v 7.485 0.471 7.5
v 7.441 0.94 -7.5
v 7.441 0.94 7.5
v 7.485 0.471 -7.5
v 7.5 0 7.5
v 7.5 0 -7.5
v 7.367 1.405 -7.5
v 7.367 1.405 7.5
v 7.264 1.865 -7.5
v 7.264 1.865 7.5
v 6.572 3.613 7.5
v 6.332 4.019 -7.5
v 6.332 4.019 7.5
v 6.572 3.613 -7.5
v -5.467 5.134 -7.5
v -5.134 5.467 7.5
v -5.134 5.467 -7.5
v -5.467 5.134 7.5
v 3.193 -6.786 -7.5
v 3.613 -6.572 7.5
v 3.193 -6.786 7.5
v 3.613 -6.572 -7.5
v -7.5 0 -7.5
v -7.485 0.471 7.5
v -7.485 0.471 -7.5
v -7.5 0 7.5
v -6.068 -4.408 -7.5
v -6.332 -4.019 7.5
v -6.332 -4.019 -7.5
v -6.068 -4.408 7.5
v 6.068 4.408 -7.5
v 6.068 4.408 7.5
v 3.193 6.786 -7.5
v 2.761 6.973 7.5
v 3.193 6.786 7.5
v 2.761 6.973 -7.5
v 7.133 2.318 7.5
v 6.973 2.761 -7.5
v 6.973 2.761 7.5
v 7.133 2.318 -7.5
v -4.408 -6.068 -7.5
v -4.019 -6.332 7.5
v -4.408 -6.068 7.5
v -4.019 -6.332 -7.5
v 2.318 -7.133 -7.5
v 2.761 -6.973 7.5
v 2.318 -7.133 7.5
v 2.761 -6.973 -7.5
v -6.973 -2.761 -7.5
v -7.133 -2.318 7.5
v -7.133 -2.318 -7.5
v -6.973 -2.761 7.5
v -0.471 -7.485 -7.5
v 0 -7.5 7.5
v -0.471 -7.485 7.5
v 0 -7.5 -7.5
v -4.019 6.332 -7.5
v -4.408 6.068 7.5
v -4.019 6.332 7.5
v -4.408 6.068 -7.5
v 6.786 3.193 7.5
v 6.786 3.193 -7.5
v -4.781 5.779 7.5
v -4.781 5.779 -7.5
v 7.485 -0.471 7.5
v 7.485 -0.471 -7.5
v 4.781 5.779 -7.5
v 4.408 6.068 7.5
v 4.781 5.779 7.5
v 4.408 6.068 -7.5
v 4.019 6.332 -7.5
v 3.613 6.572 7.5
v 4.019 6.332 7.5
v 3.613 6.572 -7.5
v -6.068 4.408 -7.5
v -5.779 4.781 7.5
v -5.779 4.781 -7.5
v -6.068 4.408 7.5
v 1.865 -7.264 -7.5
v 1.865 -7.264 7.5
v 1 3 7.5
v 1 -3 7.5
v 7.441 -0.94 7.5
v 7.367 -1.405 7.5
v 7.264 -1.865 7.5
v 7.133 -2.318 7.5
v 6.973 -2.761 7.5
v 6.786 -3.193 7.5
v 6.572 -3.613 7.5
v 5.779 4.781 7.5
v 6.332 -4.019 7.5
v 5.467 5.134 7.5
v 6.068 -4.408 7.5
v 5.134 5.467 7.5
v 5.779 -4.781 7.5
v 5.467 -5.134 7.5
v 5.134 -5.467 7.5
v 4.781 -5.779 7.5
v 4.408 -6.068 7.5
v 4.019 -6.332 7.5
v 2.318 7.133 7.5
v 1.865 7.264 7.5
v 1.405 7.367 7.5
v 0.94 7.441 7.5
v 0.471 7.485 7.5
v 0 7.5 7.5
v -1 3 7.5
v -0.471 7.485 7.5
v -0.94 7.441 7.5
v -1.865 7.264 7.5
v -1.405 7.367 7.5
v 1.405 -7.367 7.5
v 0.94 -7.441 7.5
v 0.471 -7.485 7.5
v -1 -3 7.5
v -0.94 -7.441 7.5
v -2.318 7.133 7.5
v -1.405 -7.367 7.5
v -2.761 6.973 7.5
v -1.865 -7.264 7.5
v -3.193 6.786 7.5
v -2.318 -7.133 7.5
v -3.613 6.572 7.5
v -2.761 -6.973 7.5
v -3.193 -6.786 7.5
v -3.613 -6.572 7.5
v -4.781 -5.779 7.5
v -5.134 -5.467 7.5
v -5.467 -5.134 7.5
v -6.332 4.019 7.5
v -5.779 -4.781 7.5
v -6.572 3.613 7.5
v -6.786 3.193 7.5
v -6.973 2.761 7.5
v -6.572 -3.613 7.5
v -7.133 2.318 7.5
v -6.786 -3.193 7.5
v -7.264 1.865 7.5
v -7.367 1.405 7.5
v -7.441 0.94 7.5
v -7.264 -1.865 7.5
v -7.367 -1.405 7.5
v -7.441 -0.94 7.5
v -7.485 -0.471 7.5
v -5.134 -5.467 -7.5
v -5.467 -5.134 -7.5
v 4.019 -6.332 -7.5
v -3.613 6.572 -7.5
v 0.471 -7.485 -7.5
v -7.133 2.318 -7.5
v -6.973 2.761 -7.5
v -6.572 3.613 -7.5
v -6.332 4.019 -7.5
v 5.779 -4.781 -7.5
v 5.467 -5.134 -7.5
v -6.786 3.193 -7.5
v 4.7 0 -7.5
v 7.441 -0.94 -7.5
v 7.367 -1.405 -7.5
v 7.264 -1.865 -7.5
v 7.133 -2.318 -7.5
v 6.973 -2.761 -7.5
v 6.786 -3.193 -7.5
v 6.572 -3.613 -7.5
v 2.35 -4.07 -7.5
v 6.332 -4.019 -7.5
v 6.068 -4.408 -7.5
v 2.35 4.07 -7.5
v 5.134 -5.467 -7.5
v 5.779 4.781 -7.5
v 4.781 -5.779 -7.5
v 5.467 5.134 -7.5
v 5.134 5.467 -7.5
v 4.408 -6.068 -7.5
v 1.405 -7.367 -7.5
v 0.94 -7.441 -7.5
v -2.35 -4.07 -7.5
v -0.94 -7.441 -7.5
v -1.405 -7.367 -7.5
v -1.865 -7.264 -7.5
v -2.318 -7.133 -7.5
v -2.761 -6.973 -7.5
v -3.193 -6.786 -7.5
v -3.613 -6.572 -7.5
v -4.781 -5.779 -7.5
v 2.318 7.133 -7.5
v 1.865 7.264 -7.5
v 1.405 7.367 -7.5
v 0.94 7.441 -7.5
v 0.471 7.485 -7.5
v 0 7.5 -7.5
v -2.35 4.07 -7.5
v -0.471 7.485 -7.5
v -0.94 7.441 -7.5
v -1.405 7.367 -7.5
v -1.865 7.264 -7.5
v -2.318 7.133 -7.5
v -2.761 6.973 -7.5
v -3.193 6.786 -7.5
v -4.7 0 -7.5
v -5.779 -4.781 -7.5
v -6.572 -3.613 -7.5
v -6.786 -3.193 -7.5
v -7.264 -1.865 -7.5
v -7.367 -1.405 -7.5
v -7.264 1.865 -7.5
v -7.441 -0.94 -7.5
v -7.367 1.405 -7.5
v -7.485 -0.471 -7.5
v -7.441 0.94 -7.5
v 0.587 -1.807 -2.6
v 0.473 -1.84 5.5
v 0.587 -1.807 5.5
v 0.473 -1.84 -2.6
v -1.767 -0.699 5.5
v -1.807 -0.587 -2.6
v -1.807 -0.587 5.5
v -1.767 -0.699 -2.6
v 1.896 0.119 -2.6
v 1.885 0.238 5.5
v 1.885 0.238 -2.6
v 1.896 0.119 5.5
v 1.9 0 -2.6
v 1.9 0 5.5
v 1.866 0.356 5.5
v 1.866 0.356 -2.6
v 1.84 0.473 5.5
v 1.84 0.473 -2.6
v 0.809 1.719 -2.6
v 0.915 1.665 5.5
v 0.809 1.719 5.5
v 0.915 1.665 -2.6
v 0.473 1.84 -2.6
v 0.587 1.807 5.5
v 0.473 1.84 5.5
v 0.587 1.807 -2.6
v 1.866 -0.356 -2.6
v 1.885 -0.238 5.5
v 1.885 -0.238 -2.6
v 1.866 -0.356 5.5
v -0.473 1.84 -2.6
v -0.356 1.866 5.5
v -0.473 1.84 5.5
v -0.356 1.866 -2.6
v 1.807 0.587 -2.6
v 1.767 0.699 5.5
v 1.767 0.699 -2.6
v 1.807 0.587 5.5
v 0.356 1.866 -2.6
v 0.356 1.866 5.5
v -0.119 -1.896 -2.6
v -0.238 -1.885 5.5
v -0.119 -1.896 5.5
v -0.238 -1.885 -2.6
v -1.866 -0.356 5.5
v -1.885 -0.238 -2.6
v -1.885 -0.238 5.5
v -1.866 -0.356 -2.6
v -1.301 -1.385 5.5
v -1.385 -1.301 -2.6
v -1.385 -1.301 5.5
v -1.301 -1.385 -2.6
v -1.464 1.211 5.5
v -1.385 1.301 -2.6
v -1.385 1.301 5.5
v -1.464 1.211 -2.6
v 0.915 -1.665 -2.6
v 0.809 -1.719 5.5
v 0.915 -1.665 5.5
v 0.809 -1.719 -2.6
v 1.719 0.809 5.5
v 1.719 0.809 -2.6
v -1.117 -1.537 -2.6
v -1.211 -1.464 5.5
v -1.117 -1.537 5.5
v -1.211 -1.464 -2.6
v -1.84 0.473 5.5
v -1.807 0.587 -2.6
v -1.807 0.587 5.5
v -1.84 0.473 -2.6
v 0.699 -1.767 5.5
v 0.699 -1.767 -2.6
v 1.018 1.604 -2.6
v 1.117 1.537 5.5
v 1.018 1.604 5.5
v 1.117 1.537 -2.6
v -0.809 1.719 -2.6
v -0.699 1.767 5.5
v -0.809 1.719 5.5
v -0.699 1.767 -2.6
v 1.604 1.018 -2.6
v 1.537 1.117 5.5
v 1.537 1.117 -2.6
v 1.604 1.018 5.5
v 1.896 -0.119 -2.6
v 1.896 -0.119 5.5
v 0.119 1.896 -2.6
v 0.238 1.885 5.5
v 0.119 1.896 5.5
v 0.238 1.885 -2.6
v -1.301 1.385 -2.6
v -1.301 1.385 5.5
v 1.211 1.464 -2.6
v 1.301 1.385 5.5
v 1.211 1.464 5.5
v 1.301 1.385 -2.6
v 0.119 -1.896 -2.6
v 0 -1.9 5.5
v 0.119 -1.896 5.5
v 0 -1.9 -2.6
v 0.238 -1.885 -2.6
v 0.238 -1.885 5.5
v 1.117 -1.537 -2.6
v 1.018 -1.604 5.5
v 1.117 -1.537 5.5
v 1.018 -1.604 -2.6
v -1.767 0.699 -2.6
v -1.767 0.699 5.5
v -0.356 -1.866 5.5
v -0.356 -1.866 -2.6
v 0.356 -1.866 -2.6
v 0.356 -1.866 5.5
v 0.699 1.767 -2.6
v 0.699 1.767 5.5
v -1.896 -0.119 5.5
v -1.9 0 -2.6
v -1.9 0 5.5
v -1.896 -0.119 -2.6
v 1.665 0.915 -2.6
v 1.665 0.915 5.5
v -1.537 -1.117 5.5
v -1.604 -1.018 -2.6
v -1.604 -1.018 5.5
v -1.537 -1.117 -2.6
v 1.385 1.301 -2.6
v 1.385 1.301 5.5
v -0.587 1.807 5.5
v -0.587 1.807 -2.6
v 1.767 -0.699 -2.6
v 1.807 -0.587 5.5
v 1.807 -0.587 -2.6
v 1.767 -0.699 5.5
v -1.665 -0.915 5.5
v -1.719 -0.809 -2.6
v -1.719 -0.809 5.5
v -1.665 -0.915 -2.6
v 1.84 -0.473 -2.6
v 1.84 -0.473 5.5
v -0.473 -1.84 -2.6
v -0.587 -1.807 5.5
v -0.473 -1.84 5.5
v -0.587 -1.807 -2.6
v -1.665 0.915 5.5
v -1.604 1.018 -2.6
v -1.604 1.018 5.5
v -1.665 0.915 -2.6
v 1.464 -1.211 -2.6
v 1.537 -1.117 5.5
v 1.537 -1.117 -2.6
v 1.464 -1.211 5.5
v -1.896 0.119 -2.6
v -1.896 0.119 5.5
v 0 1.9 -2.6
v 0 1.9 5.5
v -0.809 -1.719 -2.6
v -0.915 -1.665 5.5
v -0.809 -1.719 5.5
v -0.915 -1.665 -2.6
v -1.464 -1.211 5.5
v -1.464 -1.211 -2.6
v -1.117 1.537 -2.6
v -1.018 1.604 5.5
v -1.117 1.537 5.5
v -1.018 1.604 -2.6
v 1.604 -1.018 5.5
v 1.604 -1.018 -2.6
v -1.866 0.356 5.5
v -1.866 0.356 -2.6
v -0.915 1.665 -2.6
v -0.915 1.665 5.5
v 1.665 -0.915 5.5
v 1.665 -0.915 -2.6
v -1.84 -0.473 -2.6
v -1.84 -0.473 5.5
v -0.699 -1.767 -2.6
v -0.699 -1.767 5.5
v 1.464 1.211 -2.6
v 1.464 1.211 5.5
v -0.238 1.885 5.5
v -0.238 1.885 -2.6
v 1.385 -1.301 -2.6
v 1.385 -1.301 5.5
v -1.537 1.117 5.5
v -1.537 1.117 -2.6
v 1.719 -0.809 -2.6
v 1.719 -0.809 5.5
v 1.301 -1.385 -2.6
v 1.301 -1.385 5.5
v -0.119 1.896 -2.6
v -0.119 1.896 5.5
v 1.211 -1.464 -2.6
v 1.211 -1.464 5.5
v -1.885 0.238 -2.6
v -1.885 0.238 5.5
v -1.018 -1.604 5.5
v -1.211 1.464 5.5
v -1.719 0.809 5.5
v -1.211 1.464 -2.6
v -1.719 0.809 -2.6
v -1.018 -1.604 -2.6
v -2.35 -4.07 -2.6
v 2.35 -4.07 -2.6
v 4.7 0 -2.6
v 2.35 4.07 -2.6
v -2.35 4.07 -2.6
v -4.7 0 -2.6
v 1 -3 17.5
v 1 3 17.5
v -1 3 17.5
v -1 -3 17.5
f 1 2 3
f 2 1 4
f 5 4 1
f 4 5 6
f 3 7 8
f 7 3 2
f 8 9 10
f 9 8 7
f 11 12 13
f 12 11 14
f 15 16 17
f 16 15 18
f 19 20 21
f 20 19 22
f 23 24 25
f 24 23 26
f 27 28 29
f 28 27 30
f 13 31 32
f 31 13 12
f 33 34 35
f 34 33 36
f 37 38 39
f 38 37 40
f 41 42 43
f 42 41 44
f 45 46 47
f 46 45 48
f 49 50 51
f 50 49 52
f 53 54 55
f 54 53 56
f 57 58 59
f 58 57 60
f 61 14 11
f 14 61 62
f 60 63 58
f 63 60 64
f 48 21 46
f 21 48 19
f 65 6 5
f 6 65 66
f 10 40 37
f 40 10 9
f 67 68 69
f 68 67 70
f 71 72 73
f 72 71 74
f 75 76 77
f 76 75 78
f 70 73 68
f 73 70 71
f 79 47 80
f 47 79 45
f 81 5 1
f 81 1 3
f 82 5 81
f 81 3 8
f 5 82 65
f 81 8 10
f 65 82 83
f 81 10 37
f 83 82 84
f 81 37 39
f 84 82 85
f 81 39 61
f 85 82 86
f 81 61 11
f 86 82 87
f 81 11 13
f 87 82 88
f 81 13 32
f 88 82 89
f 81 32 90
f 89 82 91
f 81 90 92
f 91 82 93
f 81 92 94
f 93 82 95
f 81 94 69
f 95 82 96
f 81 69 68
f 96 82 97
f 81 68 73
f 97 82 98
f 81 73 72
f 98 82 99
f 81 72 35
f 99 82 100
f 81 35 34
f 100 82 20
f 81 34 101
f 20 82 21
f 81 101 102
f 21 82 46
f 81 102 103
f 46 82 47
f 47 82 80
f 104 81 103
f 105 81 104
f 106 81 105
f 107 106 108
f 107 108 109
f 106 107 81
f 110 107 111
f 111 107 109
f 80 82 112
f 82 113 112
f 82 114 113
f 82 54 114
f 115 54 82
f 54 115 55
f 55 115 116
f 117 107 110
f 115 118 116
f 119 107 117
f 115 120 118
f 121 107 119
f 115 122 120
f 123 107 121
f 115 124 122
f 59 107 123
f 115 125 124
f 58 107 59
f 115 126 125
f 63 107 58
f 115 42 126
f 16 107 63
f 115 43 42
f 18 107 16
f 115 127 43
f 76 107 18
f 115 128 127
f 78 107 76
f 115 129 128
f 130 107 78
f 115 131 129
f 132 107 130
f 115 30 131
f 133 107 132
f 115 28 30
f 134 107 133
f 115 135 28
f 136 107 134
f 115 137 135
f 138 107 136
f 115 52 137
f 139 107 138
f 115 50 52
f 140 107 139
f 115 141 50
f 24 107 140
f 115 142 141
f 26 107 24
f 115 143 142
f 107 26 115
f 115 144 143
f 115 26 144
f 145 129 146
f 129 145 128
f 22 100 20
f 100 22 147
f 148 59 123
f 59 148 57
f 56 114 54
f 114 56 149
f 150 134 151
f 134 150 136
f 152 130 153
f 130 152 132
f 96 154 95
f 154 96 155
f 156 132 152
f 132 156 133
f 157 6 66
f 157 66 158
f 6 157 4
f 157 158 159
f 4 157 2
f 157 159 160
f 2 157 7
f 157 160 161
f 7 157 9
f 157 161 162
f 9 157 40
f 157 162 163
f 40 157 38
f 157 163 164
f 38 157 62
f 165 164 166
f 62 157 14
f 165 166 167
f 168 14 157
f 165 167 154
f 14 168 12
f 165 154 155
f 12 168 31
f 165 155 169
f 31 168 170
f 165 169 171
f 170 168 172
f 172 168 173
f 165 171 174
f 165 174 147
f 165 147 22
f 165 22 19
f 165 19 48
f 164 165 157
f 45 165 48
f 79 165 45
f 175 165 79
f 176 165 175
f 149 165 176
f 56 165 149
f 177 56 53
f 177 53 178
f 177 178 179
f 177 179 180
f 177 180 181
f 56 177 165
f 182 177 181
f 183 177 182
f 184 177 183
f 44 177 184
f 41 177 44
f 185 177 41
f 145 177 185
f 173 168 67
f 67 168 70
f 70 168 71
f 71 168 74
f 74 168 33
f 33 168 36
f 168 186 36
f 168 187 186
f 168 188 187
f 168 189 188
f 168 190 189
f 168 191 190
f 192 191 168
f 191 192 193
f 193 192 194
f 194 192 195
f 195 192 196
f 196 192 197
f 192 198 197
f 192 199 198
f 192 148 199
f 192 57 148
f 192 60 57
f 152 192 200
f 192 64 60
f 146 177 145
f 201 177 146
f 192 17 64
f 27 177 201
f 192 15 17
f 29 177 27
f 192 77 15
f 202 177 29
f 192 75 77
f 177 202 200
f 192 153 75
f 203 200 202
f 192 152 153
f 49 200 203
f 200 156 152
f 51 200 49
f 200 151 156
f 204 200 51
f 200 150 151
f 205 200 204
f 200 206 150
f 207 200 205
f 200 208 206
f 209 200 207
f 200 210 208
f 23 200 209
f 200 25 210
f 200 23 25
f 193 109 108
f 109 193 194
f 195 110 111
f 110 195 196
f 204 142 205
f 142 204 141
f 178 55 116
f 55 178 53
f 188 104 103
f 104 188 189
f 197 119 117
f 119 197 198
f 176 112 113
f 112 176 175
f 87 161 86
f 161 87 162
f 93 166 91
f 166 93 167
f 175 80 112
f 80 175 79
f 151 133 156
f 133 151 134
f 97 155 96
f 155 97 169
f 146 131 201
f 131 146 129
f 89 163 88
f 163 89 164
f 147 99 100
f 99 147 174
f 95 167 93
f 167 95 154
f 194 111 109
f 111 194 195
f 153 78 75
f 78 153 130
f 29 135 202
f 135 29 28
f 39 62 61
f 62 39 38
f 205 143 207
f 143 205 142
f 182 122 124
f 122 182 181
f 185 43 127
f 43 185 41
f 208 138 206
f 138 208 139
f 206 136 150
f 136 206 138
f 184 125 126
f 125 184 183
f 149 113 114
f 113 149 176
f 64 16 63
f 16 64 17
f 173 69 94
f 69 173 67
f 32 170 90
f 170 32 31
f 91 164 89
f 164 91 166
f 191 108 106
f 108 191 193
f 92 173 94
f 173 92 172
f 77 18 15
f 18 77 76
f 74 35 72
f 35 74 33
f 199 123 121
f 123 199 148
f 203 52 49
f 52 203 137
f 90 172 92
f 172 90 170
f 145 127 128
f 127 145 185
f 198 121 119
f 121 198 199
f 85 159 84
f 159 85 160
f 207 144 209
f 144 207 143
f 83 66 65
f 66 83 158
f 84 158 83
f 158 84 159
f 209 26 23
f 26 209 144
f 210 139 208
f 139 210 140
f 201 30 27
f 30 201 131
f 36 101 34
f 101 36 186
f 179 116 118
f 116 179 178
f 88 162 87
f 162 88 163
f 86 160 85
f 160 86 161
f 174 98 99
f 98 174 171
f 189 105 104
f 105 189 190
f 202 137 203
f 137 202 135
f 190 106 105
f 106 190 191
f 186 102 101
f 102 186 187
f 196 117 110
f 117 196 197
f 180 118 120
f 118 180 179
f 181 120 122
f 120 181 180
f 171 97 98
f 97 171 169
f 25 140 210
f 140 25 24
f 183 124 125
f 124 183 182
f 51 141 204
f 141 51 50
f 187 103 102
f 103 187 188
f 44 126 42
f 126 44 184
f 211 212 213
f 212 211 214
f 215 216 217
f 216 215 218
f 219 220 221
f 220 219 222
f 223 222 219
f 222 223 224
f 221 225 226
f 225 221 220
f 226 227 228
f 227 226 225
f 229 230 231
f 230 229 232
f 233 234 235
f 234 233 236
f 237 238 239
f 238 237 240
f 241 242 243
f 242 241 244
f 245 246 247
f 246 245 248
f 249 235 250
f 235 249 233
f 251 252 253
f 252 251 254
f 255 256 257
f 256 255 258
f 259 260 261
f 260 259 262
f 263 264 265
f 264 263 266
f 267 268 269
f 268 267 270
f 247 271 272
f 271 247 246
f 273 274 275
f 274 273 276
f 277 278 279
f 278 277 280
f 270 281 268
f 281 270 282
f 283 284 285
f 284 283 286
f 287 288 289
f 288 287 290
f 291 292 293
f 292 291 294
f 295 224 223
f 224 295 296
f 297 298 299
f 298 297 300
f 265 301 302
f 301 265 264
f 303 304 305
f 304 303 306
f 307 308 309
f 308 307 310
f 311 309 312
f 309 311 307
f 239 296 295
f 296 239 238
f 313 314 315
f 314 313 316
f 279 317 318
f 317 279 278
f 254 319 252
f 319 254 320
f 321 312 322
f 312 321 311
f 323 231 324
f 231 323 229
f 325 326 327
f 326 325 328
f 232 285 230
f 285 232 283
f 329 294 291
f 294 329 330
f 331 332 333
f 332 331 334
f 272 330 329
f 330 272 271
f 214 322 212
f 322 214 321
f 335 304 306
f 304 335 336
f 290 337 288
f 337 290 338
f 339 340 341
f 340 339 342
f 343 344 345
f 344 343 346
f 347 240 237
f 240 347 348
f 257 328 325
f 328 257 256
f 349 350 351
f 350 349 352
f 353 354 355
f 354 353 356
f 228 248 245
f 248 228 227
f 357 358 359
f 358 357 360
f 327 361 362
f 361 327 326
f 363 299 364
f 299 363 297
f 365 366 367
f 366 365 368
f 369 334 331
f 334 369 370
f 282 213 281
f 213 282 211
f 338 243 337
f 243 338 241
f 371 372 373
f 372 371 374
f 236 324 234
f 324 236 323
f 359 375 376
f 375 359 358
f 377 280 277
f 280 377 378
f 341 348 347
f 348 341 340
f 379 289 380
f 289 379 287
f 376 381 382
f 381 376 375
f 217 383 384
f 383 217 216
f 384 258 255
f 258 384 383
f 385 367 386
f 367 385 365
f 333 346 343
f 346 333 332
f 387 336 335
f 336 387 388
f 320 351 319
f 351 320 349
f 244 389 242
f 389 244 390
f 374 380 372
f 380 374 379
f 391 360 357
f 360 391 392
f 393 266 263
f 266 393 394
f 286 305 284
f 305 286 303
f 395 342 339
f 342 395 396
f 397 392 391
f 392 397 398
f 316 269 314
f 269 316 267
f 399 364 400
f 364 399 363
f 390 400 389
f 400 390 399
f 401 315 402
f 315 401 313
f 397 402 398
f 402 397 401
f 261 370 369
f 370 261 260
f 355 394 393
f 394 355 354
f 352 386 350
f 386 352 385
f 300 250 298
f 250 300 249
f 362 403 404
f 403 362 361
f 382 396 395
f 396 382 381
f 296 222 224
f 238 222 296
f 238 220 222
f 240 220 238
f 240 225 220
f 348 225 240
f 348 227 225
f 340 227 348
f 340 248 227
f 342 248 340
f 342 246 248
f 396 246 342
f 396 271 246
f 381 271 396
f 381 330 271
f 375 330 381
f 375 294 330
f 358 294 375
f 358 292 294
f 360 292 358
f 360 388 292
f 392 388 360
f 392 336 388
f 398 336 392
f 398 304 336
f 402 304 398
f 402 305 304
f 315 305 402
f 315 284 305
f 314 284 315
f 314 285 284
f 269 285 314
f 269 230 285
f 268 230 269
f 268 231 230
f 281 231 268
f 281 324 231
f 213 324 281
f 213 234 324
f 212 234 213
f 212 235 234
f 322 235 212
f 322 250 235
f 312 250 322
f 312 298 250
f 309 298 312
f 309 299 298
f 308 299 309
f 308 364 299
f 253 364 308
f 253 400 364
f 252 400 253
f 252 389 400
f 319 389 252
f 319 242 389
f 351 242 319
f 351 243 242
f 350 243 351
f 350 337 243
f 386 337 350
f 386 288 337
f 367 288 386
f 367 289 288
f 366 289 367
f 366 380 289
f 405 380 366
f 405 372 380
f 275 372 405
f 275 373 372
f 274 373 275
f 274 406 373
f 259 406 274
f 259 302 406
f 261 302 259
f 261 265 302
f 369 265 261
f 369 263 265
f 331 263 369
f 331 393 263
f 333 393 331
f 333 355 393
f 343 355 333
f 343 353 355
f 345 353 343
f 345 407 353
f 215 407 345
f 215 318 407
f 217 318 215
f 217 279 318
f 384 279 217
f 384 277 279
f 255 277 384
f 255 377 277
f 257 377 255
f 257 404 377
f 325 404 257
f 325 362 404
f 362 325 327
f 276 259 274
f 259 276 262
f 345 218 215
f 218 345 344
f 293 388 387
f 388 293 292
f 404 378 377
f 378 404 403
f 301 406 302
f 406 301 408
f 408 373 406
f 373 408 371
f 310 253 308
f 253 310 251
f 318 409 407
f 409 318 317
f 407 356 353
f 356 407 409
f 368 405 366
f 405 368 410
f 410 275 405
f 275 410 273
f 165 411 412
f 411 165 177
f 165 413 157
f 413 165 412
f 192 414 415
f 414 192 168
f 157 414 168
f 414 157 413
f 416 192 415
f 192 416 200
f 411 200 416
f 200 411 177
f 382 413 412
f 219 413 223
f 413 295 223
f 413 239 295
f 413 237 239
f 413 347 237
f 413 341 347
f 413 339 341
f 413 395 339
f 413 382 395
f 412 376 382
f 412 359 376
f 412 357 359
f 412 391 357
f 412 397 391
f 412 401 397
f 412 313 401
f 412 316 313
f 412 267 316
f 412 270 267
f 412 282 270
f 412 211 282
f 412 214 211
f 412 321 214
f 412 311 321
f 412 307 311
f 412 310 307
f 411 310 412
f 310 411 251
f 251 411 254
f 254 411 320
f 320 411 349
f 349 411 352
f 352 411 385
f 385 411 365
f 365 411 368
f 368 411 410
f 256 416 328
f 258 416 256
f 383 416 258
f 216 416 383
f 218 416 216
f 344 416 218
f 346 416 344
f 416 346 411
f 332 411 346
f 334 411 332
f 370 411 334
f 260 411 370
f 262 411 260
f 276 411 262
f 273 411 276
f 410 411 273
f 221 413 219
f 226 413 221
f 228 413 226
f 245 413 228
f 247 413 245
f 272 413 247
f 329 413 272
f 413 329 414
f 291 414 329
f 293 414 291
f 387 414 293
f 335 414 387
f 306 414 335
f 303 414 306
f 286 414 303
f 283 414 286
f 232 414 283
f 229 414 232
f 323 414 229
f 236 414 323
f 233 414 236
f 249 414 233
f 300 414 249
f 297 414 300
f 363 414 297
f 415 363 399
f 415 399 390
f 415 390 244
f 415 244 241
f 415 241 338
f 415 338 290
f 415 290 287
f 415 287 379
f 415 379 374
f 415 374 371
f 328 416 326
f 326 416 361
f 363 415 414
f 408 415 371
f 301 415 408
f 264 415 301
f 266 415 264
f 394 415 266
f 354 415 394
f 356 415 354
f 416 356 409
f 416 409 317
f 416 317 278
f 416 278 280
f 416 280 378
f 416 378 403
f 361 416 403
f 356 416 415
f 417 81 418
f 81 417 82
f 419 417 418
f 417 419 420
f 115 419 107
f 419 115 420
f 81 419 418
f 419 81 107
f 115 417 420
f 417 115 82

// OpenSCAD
// [FL_INDEX: keywords="openscad, 3d_parametric, EndStop_Striker_for_Optical_EndStop, csg_solid" | COT="Parametric OpenSCAD design from 3DCodeverse"]
// Title: EndStop Striker for Optical EndStop

/* End stop striker for optical end stop
   -- Williams

http://www.amazon.com/OpenSCAD-3D-Printing-Al-Williams-ebook/dp/B00I6K19OM

The idea is to put an endstop bolt in through a
locknut (nylock) and then CA glue 
the nut to the body. This provides a narrow
striker for an optical end stop */


$fn=100+0;

// Main body diameter (mm)
main_diameter=15;
// Main body length (mm)
body_length=15;
// Nut diameter (mm; 8.5mm=#6)
nut_diameter=9.4;
// Nut height (mm; 5mm=#6)
nut_height=5;
// Depth to cut out nut (mm)
nut_depth=1;

// Striker length (mm)
striker_length=10;
// Striker width (mm)
striker_x=2;
// Striker height (mm)
striker_y=6;

// Bolt hole diameter (mm; 3.8=#6)
bolt_diameter=3.8;


module nutHole(size,height)
  {
  cylinder(r=size,h=height,$fn=6,center=[0,0]);
  }

union() {
translate([0,0,body_length/2+striker_length/2]) cube([striker_x,striker_y,striker_length],center=true);
difference() {
  cylinder(r=main_diameter/2,h=body_length,center=true);
  translate([0,0,-2]) cylinder(r=bolt_diameter/2,h=body_length,center=true);
translate([0,0,-(body_length/2+.1)]) nutHole(size=nut_diameter/2,height=nut_height);
}
}
